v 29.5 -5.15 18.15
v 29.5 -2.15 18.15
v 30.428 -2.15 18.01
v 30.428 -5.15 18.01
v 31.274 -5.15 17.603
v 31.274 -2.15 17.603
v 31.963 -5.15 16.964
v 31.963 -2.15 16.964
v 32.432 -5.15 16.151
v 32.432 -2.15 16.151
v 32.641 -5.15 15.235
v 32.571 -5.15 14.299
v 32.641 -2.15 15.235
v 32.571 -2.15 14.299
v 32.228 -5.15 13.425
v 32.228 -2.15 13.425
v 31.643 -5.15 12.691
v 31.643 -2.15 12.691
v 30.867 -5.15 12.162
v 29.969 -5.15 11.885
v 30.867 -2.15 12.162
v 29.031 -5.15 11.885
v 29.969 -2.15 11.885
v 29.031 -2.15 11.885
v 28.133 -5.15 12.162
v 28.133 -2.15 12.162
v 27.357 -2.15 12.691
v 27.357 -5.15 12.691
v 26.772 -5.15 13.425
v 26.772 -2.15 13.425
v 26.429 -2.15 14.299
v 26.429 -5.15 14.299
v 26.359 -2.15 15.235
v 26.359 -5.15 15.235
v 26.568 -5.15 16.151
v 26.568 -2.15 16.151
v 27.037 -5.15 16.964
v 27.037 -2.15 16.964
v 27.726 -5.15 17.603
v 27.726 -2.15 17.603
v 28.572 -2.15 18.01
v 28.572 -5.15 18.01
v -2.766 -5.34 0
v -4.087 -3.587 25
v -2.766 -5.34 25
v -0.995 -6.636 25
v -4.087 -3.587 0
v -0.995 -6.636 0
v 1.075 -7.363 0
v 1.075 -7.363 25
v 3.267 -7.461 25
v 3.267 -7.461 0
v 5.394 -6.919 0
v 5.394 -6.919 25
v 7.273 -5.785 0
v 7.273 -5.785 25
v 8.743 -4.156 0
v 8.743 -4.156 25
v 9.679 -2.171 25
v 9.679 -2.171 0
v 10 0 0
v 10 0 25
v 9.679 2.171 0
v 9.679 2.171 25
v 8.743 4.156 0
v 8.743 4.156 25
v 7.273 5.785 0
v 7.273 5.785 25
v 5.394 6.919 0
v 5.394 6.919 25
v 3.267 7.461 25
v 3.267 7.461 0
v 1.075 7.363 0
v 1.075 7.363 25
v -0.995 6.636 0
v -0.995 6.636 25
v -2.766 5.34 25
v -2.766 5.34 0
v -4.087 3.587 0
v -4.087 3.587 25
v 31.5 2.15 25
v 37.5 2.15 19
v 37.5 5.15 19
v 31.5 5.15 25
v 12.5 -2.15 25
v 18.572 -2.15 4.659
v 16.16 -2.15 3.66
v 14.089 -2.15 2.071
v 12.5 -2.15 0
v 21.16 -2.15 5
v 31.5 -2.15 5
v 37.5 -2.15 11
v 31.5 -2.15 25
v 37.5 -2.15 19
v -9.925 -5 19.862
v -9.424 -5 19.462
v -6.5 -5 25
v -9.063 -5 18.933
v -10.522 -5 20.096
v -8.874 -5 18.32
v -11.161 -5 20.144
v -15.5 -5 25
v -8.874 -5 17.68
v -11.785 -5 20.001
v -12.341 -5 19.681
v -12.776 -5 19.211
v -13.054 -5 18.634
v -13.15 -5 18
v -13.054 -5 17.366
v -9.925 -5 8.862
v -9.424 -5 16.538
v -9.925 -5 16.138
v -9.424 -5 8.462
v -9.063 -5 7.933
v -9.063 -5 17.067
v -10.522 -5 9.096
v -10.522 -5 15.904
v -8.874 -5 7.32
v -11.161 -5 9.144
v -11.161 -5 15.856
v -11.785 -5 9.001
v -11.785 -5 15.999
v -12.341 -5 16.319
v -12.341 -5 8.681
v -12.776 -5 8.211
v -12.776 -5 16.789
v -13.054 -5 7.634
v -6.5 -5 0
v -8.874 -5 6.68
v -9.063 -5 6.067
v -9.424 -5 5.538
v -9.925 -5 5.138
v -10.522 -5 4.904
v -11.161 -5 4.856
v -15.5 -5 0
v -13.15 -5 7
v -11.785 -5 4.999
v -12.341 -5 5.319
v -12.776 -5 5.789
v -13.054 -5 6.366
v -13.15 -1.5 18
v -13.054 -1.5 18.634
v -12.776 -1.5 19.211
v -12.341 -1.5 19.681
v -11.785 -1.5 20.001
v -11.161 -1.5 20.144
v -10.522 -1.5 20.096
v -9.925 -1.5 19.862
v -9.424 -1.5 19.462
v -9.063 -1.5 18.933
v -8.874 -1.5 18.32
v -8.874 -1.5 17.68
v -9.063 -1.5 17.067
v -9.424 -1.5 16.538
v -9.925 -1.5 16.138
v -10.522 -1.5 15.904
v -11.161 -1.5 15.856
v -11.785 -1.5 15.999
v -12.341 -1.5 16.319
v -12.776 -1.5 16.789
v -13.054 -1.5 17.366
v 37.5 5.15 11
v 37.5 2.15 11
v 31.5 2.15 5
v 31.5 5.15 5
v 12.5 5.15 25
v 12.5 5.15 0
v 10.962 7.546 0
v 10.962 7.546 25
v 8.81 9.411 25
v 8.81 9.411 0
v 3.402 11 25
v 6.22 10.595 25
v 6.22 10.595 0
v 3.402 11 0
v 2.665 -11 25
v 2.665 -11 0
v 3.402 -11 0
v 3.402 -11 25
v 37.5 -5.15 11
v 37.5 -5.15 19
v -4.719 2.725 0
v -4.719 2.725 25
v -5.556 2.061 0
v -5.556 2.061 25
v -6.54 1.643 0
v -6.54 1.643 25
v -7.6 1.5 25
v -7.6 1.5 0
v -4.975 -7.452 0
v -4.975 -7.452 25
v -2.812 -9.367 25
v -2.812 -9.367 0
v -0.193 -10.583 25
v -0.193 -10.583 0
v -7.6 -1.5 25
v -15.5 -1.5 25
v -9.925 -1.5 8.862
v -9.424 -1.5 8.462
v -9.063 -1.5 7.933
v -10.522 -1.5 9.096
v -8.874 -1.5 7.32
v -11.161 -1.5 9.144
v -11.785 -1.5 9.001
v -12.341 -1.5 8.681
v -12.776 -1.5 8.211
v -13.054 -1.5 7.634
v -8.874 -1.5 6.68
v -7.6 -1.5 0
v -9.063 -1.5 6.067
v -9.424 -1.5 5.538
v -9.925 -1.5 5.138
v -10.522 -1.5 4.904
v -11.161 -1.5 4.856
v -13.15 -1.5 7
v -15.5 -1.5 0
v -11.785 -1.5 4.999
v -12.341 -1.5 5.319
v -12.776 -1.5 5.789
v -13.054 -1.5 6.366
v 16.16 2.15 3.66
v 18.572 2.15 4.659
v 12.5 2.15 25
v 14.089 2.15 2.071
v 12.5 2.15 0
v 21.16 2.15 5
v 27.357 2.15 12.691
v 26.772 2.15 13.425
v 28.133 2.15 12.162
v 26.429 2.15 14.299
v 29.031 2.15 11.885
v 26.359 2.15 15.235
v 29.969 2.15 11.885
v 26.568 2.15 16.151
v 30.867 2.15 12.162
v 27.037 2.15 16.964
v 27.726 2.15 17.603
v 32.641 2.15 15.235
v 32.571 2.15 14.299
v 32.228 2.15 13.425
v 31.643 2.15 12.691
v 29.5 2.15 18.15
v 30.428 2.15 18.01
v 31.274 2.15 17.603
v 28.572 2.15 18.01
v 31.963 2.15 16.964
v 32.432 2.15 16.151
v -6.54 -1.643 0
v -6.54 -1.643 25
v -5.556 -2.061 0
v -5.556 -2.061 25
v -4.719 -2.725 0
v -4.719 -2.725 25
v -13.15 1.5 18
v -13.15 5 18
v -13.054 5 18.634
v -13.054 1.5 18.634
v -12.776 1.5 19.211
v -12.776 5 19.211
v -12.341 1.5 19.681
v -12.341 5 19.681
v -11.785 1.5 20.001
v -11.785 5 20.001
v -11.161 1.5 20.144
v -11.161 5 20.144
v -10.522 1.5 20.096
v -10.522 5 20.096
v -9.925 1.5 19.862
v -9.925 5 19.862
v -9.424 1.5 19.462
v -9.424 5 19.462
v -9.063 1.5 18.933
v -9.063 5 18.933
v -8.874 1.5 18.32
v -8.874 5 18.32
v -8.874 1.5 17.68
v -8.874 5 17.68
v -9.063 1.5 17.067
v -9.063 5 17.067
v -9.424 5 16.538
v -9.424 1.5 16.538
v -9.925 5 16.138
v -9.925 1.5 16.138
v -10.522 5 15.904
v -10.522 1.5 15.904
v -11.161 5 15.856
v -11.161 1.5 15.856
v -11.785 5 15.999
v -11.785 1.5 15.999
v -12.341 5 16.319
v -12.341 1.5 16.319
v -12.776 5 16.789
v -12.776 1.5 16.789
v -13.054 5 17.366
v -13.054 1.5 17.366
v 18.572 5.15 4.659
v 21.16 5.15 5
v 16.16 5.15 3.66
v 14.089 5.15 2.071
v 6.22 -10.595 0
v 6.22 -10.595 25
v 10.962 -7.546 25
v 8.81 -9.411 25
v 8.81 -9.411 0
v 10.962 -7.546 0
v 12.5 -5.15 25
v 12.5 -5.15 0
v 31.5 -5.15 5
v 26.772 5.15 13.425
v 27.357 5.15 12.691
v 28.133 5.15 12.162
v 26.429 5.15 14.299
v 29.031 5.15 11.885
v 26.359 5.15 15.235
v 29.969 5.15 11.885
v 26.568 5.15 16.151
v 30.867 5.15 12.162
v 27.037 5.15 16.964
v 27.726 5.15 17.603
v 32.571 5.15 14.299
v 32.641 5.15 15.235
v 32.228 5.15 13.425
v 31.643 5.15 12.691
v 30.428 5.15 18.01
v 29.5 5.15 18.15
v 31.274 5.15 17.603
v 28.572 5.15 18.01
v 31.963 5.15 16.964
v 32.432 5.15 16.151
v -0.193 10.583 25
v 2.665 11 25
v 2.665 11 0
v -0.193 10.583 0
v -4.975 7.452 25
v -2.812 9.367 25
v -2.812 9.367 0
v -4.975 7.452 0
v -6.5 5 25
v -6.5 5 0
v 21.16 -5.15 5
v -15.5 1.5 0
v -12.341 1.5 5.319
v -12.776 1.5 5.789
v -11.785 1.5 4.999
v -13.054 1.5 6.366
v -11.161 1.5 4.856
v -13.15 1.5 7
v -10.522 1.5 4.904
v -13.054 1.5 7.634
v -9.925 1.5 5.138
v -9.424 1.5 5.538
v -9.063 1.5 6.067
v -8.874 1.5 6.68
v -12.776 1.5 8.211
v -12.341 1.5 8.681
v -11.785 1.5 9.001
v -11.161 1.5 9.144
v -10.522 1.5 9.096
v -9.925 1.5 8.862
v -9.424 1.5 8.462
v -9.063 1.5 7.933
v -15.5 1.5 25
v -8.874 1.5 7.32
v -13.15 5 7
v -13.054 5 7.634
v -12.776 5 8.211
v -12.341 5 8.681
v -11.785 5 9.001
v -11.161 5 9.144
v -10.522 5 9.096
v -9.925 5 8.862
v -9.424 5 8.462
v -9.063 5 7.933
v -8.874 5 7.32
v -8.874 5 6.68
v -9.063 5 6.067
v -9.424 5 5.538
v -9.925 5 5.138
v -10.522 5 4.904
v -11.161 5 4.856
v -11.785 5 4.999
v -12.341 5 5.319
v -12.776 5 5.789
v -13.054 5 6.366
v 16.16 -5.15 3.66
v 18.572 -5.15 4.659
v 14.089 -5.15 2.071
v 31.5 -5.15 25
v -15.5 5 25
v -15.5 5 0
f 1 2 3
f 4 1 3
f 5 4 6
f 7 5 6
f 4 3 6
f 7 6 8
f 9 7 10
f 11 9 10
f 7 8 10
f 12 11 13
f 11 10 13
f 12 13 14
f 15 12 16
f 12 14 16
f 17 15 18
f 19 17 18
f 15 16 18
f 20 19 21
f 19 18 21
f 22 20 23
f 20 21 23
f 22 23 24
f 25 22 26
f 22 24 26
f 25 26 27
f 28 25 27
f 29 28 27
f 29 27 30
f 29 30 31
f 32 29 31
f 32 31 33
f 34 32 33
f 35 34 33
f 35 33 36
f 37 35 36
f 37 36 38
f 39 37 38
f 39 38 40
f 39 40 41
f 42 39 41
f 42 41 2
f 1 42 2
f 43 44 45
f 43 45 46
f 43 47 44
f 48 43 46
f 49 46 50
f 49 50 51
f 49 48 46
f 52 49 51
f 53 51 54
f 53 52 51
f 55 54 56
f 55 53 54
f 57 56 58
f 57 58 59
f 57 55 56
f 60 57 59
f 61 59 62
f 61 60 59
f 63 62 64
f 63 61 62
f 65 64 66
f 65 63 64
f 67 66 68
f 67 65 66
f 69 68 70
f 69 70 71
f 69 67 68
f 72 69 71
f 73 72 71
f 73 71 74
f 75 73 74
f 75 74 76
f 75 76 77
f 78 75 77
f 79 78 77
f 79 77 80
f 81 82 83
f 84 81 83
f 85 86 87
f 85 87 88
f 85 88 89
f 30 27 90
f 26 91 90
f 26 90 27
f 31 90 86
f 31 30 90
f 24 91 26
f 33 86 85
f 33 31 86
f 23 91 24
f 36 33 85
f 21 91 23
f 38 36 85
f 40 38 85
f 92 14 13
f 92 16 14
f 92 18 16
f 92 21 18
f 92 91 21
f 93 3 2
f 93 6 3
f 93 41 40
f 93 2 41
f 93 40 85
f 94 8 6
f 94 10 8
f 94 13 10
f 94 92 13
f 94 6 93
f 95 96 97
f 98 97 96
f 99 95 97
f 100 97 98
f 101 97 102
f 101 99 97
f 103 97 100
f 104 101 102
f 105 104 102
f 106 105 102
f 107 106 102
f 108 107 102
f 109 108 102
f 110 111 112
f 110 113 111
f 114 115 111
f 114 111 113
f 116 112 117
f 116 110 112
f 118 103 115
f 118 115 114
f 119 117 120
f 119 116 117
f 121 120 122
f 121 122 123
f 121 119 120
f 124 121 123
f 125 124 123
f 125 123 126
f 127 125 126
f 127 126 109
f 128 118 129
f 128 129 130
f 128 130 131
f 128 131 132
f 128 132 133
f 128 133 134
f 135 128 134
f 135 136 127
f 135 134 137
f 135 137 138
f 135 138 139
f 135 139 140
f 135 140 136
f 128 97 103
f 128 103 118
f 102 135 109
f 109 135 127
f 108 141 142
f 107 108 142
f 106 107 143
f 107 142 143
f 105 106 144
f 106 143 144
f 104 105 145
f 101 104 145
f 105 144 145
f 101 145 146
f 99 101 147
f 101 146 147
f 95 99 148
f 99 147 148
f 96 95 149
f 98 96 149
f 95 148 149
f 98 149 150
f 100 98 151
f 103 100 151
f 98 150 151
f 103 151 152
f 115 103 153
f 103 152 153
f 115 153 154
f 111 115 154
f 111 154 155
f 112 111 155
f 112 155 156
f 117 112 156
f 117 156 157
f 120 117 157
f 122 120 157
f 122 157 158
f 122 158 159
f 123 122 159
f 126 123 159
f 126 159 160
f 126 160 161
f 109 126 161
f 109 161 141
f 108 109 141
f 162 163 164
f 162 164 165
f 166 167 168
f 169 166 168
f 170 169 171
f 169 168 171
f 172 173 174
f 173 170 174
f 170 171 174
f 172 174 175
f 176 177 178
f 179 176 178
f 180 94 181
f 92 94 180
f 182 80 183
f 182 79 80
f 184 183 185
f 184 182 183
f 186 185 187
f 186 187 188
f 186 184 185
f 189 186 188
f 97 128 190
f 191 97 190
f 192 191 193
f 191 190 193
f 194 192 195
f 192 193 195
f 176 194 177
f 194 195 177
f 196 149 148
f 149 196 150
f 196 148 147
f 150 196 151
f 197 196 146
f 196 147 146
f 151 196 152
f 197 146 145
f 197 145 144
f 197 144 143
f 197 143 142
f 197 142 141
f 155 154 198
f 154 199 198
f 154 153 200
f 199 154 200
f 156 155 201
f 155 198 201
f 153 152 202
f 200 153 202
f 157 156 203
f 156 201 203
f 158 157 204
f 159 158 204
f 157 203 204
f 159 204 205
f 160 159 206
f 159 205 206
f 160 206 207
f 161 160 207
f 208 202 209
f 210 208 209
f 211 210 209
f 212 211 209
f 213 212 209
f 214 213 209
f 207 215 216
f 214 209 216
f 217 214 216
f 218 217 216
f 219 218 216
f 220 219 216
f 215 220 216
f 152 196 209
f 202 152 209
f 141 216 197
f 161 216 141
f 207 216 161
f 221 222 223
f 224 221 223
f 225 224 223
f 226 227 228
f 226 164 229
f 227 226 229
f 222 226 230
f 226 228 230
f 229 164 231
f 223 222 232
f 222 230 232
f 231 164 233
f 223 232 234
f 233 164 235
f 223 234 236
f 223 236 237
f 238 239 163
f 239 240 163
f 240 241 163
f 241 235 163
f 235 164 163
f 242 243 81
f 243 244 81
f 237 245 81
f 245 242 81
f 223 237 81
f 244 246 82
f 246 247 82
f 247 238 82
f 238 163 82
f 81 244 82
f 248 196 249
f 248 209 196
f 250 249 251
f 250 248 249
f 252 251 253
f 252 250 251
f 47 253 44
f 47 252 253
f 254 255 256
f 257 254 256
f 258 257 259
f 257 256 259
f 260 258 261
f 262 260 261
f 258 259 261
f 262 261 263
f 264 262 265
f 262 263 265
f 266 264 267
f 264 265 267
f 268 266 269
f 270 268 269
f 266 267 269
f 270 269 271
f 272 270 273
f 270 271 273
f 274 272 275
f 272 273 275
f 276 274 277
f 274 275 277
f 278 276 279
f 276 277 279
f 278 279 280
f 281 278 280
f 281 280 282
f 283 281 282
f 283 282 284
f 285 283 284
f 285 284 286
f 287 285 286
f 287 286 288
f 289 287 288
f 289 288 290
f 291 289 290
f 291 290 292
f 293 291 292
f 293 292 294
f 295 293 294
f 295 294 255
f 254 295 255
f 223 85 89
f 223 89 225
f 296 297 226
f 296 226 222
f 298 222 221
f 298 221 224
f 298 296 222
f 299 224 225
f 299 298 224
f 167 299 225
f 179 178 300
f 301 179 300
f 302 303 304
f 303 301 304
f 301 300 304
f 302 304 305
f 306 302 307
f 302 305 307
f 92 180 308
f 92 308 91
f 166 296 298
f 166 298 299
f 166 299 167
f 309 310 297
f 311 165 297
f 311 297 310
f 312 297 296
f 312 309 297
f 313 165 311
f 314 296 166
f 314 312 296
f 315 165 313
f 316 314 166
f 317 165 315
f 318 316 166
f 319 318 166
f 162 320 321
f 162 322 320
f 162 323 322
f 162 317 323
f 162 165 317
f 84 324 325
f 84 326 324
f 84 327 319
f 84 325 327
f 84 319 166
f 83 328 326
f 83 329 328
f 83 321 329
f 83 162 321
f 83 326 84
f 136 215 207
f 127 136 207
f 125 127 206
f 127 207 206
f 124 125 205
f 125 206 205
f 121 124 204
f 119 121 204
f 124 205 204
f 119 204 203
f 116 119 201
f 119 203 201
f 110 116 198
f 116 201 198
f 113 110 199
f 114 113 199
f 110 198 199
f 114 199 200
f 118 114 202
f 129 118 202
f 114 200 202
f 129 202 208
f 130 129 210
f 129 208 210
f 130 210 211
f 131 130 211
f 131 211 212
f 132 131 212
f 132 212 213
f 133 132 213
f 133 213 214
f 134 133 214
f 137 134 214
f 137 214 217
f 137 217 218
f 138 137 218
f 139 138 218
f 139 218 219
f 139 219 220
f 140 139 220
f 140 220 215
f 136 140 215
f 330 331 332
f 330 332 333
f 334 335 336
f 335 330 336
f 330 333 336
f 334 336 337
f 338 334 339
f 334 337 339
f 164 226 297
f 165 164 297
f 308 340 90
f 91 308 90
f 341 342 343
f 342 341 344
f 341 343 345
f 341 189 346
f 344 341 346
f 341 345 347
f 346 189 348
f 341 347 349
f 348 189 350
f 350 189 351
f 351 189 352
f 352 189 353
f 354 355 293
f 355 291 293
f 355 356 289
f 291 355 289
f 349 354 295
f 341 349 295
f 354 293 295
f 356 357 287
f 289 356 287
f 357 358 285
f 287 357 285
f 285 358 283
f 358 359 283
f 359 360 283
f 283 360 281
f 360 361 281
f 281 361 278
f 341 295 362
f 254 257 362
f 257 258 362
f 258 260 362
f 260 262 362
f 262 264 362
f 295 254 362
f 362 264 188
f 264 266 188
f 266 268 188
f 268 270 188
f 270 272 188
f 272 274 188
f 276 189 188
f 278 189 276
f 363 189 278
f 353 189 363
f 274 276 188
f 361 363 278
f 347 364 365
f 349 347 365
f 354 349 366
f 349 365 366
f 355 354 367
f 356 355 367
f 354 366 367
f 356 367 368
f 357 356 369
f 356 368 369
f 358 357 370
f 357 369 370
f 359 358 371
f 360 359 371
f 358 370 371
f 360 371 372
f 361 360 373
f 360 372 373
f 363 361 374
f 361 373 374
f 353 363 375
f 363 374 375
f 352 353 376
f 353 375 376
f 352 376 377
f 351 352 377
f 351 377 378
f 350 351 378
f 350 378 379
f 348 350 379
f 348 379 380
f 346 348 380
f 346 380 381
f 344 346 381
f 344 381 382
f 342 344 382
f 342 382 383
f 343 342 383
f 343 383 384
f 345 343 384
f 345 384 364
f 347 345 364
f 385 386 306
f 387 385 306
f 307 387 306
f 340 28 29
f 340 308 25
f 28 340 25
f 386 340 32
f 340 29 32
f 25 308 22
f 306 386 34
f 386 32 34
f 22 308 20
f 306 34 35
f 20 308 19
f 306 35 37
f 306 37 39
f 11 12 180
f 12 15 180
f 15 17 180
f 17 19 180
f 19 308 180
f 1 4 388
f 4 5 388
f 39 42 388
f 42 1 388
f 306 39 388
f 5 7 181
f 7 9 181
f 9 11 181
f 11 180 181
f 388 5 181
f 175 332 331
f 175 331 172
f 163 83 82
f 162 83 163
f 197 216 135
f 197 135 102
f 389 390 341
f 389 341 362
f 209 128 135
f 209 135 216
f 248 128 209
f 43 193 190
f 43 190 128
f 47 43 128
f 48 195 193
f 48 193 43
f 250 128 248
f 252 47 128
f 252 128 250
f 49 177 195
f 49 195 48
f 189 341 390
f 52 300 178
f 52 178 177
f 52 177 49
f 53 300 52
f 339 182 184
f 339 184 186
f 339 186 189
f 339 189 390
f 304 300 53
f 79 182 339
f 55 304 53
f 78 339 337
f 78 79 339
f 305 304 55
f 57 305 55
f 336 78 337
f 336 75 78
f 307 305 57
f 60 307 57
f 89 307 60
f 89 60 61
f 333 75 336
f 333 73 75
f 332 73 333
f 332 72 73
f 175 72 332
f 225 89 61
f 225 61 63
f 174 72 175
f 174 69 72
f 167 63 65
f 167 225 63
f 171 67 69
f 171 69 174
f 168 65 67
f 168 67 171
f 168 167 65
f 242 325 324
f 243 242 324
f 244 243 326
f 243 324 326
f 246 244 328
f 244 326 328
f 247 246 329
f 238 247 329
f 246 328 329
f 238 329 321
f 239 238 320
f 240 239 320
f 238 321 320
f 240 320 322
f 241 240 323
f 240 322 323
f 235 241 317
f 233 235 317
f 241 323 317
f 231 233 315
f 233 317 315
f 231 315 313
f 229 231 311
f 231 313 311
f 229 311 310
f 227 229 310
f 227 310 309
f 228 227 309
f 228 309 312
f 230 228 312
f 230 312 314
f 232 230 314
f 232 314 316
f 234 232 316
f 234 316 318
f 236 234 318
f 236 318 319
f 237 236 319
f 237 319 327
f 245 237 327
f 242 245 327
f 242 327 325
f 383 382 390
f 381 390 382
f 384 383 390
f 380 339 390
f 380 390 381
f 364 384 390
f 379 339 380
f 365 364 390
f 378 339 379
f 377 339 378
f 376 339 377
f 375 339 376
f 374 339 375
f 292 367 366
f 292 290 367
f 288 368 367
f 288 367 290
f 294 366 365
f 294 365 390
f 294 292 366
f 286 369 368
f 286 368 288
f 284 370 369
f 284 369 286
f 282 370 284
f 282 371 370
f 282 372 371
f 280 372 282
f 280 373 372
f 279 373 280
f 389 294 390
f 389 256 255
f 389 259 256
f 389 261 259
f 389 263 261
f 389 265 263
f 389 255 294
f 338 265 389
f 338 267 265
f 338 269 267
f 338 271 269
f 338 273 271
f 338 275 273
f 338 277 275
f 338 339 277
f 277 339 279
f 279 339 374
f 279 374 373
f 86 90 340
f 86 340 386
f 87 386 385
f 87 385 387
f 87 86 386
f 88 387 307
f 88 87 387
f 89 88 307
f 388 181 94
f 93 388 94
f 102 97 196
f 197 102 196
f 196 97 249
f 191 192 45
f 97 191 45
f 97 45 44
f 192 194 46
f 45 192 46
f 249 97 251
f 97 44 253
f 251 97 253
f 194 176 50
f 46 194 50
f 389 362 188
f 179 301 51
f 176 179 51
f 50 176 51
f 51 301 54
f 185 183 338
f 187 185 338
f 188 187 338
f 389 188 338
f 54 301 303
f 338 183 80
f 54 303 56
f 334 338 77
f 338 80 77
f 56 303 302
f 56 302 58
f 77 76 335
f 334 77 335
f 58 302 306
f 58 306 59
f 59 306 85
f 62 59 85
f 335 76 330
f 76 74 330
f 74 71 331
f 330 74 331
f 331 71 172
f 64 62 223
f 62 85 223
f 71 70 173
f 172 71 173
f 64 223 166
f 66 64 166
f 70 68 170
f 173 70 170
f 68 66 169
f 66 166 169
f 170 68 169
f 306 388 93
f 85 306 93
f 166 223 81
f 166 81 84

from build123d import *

# Parameters (mm, degrees)
SKETCH_1_W          = 25
SKETCH_1_H          = 22
SKETCH_1_R          = 7.5
EXTRUDE_1_DEPTH     = 25
SKETCH_2_W          = 20
SKETCH_2_H          = 3
EXTRUDE_2_DEPTH     = 25
SKETCH_3_R          = 3.15
CUT_EXTRUDE_1_DEPTH = 25
FILLET_2_R          = 10
SKETCH_4_W          = 6
SKETCH_4_H          = 6
CUT_EXTRUDE_2_DEPTH = 25
FILLET_3_R          = 10
FILLET_4_R          = 10
SKETCH_5_W          = 21.715962642
SKETCH_5_H          = 3
CUT_EXTRUDE_3_DEPTH = 25
FILLET_5_R          = 4
SKETCH_8_W          = 25
SKETCH_8_H          = 3.5
EXTRUDE_3_DEPTH     = 3
SKETCH_6_R          = 2.15
CUT_EXTRUDE_4_DEPTH = 25
CHAMFER_1_SIZE      = 6


with BuildPart() as part:
    # 草图1 → 凸台-拉伸1 (new body)
    with BuildSketch(Plane.XY):
        Rectangle(SKETCH_1_W, SKETCH_1_H)
        with Locations((2.5, 0)):
            Circle(SKETCH_1_R, mode=Mode.SUBTRACT)
    extrude(amount=EXTRUDE_1_DEPTH)

    # 草图2 → 凸台-拉伸2 (add)
    with BuildSketch(Plane(origin=(12.5, 0, 0), x_dir=(0, 0, -1), z_dir=(1, 0, 0))):
        with Locations((-15, 3.65)):
            Rectangle(SKETCH_2_W, SKETCH_2_H)
        with Locations((-15, -3.65)):
            Rectangle(SKETCH_2_W, SKETCH_2_H)
    extrude(amount=EXTRUDE_2_DEPTH)

    # 草图3 → 切除-拉伸1 (cut)
    with BuildSketch(Plane(origin=(0, 5.15, 0), x_dir=(1, 0, 0), z_dir=(0, 1, 0))):
        with Locations(Location((29.5, -15, 0), (0, 0, 270))):
            Circle(SKETCH_3_R)
    extrude(amount=-CUT_EXTRUDE_1_DEPTH, mode=Mode.SUBTRACT)

    # 圆角2
    # the kernel refuses this fillet: 10 mm, written as the material it adds along each edge
    with BuildSketch(Plane(origin=(12.5, 5.15, 5), x_dir=(0, 0, -1), z_dir=(0, -1, 0)), Plane(origin=(12.5, -2.15, 5), x_dir=(0, 0, -1), z_dir=(0, -1, 0))) as fillet_2_piece_1:
        with BuildLine():
            CenterArc((10, 8.660254038), FILLET_2_R, 180, 60)
            Line((0, 8.660254038), (-0.2, 8.660254038))
            Line((-0.2, 8.660254038), (-0.2, 0))
            Line((-0.2, 0), (0, -0.2))
            ThreePointArc((0, -0.2), (2.5, -0.2), (4.9, -0.173205081))
            Line((4.9, -0.173205081), (5, 0))
        make_face()
    extrude(amount=3)
    with BuildSketch(Plane(origin=(12.5, 5.15, 5), x_dir=(0, 0, -1), z_dir=(0, -1, 0))) as fillet_2_piece_2_section:
        with BuildLine():
            CenterArc((10, 8.660254038), FILLET_2_R, 180, 60)
            Line((0, 8.660254038), (-0.2, 8.660254038))
            Line((-0.2, 8.660254038), (-0.2, 0))
            Line((-0.2, 0), (0, -0.2))
            ThreePointArc((0, -0.2), (2.5, -0.2), (4.9, -0.173205081))
            Line((4.9, -0.173205081), (5, 0))
        make_face()
    fillet_2_piece_2 = extrude(amount=24.650635095, mode=Mode.PRIVATE)
    fillet_2_piece_2 = split(fillet_2_piece_2, bisect_by=Plane(origin=(14.663104458, -5.15, 3.704832889), z_dir=(0, 1, 0)), keep=Keep.TOP, mode=Mode.PRIVATE)
    fillet_2_piece_2 = split(fillet_2_piece_2, bisect_by=Plane(origin=(14.663104458, -2.15, 3.704832889), z_dir=(0, -1, 0)), keep=Keep.TOP, mode=Mode.PRIVATE)
    add(fillet_2_piece_2)
    with BuildSketch(Plane(origin=(12.5, 19.500635095, 5), x_dir=(0, 0, -1), z_dir=(0, -1, 0))) as fillet_2_piece_3_section:
        with BuildLine():
            CenterArc((10, 8.660254038), FILLET_2_R, 180, 60)
            Line((0, 8.660254038), (-0.2, 8.660254038))
            Line((-0.2, 8.660254038), (-0.2, 0))
            Line((-0.2, 0), (0, -0.2))
            ThreePointArc((0, -0.2), (2.5, -0.2), (4.9, -0.173205081))
            Line((4.9, -0.173205081), (5, 0))
        make_face()
    fillet_2_piece_3 = extrude(amount=24.650635095, mode=Mode.PRIVATE)
    fillet_2_piece_3 = split(fillet_2_piece_3, bisect_by=Plane(origin=(14.663104458, 2.15, 3.704832889), z_dir=(0, 1, 0)), keep=Keep.TOP, mode=Mode.PRIVATE)
    fillet_2_piece_3 = split(fillet_2_piece_3, bisect_by=Plane(origin=(14.663104458, 5.15, 3.704832889), z_dir=(0, -1, 0)), keep=Keep.TOP, mode=Mode.PRIVATE)
    add(fillet_2_piece_3)

    # 草图4 → 切除-拉伸2 (cut)
    with BuildSketch(Plane(origin=(0, 0, 0), x_dir=(-1, 0, 0), z_dir=(0, 0, -1))):
        with Locations((9.5, 8)):
            Rectangle(SKETCH_4_W, SKETCH_4_H)
        with Locations((9.5, -8)):
            Rectangle(SKETCH_4_W, SKETCH_4_H)
    extrude(amount=-CUT_EXTRUDE_2_DEPTH, mode=Mode.SUBTRACT)

    # 圆角3
    # the kernel refuses this fillet: 10 mm, written as the material it takes off along each edge
    with BuildSketch(Plane(origin=(-6.5, -11, -22.912878475), x_dir=(0, 1, 0), z_dir=(0, 0, 1))) as fillet_3_piece_1:
        with BuildLine():
            CenterArc((10, -9.16515139), FILLET_3_R, 113.578178478, 66.421821522)
            Line((0, -9.16515139), (-0.2, -9.16515139))
            Line((-0.2, -9.16515139), (-0.2, 0))
            Line((-0.2, 0), (0, 0.2))
            ThreePointArc((0, 0.2), (3, 0.2), (5.92, 0.183303028))
            Line((5.92, 0.183303028), (6, 0))
        make_face()
    extrude(amount=70.82575695, mode=Mode.SUBTRACT)
    with BuildSketch(Plane(origin=(-6.5, 11, -22.912878475), x_dir=(1, 0, 0), z_dir=(0, 0, 1))) as fillet_3_piece_2:
        with BuildLine():
            CenterArc((9.16515139, -10), FILLET_3_R, 90, 66.421821522)
            Line((0, -6), (-0.183303028, -5.92))
            ThreePointArc((-0.183303028, -5.92), (-0.2, -3), (-0.2, 0))
            Line((-0.2, 0), (0, 0.2))
            Line((0, 0.2), (9.16515139, 0.2))
            Line((9.16515139, 0.2), (9.16515139, 0))
        make_face()
    extrude(amount=70.82575695, mode=Mode.SUBTRACT)

    # 圆角4
    # the kernel refuses this fillet: 10 mm, written as the material it takes off along each edge
    with BuildSketch(Plane(origin=(12.5, 11, -22.745535276), x_dir=(0, -1, 0), z_dir=(0, 0, 1))) as fillet_4_piece_1:
        with BuildLine():
            CenterArc((10, -9.09821411), FILLET_4_R, 114.519316483, 65.480683517)
            Line((0, -9.09821411), (-0.2, -9.09821411))
            Line((-0.2, -9.09821411), (-0.2, 0))
            Line((-0.2, 0), (0, 0.2))
            ThreePointArc((0, 0.2), (2.925, 0.2), (5.767, 0.181964282))
            Line((5.767, 0.181964282), (5.85, 0))
        make_face()
    extrude(amount=70.491070552, mode=Mode.SUBTRACT)
    with BuildSketch(Plane(origin=(12.5, -11, -22.745535276), x_dir=(-1, 0, 0), z_dir=(0, 0, 1))) as fillet_4_piece_2:
        with BuildLine():
            CenterArc((9.09821411, -10), FILLET_4_R, 90, 65.480683517)
            Line((0, -5.85), (-0.181964282, -5.767))
            ThreePointArc((-0.181964282, -5.767), (-0.2, -2.925), (-0.2, 0))
            Line((-0.2, 0), (0, 0.2))
            Line((0, 0.2), (9.09821411, 0.2))
            Line((9.09821411, 0.2), (9.09821411, 0))
        make_face()
    extrude(amount=70.491070552, mode=Mode.SUBTRACT)

    # 草图5 → 切除-拉伸3 (cut)
    with BuildSketch(Plane(origin=(0, 0, 0), x_dir=(-1, 0, 0), z_dir=(0, 0, -1))):
        with Locations((12.5, 0)):
            Rectangle(SKETCH_5_W, SKETCH_5_H)
    extrude(amount=-CUT_EXTRUDE_3_DEPTH, mode=Mode.SUBTRACT)

    # 圆角5
    fillet_5_edges = [part.edges().sort_by_distance(p)[0] for p in [
        (-4.848469228, -1.5, 12.5),
        (-4.848469228, 1.5, 12.5),
    ]]
    fillet(fillet_5_edges, radius=FILLET_5_R)

    # 草图8 → 凸台-拉伸3 (add)
    with BuildSketch(Plane.ZY.offset(12.5)):
        with Locations((12.5, 3.25)):
            Rectangle(SKETCH_8_W, SKETCH_8_H)
        with Locations((12.5, -3.25)):
            Rectangle(SKETCH_8_W, SKETCH_8_H)
    extrude(amount=EXTRUDE_3_DEPTH)

    # 草图6 → 切除-拉伸4 (cut)
    with BuildSketch(Plane(origin=(0, 5, 0), x_dir=(1, 0, 0), z_dir=(0, 1, 0))):
        with Locations(Location((-11, -7, 0), (0, 0, 180))):
            Circle(SKETCH_6_R)
        with Locations(Location((-11, -18, 0), (0, 0, 180))):
            Circle(SKETCH_6_R)
    extrude(amount=-CUT_EXTRUDE_4_DEPTH, mode=Mode.SUBTRACT)

    # 倒角1
    chamfer_1_edges = [part.edges().sort_by_distance(p)[0] for p in [
        (37.5, 3.65, 25),
        (37.5, 3.65, 5),
        (37.5, -3.65, 25),
        (37.5, -3.65, 5),
    ]]
    chamfer(chamfer_1_edges, length=CHAMFER_1_SIZE)


solid = part.part
